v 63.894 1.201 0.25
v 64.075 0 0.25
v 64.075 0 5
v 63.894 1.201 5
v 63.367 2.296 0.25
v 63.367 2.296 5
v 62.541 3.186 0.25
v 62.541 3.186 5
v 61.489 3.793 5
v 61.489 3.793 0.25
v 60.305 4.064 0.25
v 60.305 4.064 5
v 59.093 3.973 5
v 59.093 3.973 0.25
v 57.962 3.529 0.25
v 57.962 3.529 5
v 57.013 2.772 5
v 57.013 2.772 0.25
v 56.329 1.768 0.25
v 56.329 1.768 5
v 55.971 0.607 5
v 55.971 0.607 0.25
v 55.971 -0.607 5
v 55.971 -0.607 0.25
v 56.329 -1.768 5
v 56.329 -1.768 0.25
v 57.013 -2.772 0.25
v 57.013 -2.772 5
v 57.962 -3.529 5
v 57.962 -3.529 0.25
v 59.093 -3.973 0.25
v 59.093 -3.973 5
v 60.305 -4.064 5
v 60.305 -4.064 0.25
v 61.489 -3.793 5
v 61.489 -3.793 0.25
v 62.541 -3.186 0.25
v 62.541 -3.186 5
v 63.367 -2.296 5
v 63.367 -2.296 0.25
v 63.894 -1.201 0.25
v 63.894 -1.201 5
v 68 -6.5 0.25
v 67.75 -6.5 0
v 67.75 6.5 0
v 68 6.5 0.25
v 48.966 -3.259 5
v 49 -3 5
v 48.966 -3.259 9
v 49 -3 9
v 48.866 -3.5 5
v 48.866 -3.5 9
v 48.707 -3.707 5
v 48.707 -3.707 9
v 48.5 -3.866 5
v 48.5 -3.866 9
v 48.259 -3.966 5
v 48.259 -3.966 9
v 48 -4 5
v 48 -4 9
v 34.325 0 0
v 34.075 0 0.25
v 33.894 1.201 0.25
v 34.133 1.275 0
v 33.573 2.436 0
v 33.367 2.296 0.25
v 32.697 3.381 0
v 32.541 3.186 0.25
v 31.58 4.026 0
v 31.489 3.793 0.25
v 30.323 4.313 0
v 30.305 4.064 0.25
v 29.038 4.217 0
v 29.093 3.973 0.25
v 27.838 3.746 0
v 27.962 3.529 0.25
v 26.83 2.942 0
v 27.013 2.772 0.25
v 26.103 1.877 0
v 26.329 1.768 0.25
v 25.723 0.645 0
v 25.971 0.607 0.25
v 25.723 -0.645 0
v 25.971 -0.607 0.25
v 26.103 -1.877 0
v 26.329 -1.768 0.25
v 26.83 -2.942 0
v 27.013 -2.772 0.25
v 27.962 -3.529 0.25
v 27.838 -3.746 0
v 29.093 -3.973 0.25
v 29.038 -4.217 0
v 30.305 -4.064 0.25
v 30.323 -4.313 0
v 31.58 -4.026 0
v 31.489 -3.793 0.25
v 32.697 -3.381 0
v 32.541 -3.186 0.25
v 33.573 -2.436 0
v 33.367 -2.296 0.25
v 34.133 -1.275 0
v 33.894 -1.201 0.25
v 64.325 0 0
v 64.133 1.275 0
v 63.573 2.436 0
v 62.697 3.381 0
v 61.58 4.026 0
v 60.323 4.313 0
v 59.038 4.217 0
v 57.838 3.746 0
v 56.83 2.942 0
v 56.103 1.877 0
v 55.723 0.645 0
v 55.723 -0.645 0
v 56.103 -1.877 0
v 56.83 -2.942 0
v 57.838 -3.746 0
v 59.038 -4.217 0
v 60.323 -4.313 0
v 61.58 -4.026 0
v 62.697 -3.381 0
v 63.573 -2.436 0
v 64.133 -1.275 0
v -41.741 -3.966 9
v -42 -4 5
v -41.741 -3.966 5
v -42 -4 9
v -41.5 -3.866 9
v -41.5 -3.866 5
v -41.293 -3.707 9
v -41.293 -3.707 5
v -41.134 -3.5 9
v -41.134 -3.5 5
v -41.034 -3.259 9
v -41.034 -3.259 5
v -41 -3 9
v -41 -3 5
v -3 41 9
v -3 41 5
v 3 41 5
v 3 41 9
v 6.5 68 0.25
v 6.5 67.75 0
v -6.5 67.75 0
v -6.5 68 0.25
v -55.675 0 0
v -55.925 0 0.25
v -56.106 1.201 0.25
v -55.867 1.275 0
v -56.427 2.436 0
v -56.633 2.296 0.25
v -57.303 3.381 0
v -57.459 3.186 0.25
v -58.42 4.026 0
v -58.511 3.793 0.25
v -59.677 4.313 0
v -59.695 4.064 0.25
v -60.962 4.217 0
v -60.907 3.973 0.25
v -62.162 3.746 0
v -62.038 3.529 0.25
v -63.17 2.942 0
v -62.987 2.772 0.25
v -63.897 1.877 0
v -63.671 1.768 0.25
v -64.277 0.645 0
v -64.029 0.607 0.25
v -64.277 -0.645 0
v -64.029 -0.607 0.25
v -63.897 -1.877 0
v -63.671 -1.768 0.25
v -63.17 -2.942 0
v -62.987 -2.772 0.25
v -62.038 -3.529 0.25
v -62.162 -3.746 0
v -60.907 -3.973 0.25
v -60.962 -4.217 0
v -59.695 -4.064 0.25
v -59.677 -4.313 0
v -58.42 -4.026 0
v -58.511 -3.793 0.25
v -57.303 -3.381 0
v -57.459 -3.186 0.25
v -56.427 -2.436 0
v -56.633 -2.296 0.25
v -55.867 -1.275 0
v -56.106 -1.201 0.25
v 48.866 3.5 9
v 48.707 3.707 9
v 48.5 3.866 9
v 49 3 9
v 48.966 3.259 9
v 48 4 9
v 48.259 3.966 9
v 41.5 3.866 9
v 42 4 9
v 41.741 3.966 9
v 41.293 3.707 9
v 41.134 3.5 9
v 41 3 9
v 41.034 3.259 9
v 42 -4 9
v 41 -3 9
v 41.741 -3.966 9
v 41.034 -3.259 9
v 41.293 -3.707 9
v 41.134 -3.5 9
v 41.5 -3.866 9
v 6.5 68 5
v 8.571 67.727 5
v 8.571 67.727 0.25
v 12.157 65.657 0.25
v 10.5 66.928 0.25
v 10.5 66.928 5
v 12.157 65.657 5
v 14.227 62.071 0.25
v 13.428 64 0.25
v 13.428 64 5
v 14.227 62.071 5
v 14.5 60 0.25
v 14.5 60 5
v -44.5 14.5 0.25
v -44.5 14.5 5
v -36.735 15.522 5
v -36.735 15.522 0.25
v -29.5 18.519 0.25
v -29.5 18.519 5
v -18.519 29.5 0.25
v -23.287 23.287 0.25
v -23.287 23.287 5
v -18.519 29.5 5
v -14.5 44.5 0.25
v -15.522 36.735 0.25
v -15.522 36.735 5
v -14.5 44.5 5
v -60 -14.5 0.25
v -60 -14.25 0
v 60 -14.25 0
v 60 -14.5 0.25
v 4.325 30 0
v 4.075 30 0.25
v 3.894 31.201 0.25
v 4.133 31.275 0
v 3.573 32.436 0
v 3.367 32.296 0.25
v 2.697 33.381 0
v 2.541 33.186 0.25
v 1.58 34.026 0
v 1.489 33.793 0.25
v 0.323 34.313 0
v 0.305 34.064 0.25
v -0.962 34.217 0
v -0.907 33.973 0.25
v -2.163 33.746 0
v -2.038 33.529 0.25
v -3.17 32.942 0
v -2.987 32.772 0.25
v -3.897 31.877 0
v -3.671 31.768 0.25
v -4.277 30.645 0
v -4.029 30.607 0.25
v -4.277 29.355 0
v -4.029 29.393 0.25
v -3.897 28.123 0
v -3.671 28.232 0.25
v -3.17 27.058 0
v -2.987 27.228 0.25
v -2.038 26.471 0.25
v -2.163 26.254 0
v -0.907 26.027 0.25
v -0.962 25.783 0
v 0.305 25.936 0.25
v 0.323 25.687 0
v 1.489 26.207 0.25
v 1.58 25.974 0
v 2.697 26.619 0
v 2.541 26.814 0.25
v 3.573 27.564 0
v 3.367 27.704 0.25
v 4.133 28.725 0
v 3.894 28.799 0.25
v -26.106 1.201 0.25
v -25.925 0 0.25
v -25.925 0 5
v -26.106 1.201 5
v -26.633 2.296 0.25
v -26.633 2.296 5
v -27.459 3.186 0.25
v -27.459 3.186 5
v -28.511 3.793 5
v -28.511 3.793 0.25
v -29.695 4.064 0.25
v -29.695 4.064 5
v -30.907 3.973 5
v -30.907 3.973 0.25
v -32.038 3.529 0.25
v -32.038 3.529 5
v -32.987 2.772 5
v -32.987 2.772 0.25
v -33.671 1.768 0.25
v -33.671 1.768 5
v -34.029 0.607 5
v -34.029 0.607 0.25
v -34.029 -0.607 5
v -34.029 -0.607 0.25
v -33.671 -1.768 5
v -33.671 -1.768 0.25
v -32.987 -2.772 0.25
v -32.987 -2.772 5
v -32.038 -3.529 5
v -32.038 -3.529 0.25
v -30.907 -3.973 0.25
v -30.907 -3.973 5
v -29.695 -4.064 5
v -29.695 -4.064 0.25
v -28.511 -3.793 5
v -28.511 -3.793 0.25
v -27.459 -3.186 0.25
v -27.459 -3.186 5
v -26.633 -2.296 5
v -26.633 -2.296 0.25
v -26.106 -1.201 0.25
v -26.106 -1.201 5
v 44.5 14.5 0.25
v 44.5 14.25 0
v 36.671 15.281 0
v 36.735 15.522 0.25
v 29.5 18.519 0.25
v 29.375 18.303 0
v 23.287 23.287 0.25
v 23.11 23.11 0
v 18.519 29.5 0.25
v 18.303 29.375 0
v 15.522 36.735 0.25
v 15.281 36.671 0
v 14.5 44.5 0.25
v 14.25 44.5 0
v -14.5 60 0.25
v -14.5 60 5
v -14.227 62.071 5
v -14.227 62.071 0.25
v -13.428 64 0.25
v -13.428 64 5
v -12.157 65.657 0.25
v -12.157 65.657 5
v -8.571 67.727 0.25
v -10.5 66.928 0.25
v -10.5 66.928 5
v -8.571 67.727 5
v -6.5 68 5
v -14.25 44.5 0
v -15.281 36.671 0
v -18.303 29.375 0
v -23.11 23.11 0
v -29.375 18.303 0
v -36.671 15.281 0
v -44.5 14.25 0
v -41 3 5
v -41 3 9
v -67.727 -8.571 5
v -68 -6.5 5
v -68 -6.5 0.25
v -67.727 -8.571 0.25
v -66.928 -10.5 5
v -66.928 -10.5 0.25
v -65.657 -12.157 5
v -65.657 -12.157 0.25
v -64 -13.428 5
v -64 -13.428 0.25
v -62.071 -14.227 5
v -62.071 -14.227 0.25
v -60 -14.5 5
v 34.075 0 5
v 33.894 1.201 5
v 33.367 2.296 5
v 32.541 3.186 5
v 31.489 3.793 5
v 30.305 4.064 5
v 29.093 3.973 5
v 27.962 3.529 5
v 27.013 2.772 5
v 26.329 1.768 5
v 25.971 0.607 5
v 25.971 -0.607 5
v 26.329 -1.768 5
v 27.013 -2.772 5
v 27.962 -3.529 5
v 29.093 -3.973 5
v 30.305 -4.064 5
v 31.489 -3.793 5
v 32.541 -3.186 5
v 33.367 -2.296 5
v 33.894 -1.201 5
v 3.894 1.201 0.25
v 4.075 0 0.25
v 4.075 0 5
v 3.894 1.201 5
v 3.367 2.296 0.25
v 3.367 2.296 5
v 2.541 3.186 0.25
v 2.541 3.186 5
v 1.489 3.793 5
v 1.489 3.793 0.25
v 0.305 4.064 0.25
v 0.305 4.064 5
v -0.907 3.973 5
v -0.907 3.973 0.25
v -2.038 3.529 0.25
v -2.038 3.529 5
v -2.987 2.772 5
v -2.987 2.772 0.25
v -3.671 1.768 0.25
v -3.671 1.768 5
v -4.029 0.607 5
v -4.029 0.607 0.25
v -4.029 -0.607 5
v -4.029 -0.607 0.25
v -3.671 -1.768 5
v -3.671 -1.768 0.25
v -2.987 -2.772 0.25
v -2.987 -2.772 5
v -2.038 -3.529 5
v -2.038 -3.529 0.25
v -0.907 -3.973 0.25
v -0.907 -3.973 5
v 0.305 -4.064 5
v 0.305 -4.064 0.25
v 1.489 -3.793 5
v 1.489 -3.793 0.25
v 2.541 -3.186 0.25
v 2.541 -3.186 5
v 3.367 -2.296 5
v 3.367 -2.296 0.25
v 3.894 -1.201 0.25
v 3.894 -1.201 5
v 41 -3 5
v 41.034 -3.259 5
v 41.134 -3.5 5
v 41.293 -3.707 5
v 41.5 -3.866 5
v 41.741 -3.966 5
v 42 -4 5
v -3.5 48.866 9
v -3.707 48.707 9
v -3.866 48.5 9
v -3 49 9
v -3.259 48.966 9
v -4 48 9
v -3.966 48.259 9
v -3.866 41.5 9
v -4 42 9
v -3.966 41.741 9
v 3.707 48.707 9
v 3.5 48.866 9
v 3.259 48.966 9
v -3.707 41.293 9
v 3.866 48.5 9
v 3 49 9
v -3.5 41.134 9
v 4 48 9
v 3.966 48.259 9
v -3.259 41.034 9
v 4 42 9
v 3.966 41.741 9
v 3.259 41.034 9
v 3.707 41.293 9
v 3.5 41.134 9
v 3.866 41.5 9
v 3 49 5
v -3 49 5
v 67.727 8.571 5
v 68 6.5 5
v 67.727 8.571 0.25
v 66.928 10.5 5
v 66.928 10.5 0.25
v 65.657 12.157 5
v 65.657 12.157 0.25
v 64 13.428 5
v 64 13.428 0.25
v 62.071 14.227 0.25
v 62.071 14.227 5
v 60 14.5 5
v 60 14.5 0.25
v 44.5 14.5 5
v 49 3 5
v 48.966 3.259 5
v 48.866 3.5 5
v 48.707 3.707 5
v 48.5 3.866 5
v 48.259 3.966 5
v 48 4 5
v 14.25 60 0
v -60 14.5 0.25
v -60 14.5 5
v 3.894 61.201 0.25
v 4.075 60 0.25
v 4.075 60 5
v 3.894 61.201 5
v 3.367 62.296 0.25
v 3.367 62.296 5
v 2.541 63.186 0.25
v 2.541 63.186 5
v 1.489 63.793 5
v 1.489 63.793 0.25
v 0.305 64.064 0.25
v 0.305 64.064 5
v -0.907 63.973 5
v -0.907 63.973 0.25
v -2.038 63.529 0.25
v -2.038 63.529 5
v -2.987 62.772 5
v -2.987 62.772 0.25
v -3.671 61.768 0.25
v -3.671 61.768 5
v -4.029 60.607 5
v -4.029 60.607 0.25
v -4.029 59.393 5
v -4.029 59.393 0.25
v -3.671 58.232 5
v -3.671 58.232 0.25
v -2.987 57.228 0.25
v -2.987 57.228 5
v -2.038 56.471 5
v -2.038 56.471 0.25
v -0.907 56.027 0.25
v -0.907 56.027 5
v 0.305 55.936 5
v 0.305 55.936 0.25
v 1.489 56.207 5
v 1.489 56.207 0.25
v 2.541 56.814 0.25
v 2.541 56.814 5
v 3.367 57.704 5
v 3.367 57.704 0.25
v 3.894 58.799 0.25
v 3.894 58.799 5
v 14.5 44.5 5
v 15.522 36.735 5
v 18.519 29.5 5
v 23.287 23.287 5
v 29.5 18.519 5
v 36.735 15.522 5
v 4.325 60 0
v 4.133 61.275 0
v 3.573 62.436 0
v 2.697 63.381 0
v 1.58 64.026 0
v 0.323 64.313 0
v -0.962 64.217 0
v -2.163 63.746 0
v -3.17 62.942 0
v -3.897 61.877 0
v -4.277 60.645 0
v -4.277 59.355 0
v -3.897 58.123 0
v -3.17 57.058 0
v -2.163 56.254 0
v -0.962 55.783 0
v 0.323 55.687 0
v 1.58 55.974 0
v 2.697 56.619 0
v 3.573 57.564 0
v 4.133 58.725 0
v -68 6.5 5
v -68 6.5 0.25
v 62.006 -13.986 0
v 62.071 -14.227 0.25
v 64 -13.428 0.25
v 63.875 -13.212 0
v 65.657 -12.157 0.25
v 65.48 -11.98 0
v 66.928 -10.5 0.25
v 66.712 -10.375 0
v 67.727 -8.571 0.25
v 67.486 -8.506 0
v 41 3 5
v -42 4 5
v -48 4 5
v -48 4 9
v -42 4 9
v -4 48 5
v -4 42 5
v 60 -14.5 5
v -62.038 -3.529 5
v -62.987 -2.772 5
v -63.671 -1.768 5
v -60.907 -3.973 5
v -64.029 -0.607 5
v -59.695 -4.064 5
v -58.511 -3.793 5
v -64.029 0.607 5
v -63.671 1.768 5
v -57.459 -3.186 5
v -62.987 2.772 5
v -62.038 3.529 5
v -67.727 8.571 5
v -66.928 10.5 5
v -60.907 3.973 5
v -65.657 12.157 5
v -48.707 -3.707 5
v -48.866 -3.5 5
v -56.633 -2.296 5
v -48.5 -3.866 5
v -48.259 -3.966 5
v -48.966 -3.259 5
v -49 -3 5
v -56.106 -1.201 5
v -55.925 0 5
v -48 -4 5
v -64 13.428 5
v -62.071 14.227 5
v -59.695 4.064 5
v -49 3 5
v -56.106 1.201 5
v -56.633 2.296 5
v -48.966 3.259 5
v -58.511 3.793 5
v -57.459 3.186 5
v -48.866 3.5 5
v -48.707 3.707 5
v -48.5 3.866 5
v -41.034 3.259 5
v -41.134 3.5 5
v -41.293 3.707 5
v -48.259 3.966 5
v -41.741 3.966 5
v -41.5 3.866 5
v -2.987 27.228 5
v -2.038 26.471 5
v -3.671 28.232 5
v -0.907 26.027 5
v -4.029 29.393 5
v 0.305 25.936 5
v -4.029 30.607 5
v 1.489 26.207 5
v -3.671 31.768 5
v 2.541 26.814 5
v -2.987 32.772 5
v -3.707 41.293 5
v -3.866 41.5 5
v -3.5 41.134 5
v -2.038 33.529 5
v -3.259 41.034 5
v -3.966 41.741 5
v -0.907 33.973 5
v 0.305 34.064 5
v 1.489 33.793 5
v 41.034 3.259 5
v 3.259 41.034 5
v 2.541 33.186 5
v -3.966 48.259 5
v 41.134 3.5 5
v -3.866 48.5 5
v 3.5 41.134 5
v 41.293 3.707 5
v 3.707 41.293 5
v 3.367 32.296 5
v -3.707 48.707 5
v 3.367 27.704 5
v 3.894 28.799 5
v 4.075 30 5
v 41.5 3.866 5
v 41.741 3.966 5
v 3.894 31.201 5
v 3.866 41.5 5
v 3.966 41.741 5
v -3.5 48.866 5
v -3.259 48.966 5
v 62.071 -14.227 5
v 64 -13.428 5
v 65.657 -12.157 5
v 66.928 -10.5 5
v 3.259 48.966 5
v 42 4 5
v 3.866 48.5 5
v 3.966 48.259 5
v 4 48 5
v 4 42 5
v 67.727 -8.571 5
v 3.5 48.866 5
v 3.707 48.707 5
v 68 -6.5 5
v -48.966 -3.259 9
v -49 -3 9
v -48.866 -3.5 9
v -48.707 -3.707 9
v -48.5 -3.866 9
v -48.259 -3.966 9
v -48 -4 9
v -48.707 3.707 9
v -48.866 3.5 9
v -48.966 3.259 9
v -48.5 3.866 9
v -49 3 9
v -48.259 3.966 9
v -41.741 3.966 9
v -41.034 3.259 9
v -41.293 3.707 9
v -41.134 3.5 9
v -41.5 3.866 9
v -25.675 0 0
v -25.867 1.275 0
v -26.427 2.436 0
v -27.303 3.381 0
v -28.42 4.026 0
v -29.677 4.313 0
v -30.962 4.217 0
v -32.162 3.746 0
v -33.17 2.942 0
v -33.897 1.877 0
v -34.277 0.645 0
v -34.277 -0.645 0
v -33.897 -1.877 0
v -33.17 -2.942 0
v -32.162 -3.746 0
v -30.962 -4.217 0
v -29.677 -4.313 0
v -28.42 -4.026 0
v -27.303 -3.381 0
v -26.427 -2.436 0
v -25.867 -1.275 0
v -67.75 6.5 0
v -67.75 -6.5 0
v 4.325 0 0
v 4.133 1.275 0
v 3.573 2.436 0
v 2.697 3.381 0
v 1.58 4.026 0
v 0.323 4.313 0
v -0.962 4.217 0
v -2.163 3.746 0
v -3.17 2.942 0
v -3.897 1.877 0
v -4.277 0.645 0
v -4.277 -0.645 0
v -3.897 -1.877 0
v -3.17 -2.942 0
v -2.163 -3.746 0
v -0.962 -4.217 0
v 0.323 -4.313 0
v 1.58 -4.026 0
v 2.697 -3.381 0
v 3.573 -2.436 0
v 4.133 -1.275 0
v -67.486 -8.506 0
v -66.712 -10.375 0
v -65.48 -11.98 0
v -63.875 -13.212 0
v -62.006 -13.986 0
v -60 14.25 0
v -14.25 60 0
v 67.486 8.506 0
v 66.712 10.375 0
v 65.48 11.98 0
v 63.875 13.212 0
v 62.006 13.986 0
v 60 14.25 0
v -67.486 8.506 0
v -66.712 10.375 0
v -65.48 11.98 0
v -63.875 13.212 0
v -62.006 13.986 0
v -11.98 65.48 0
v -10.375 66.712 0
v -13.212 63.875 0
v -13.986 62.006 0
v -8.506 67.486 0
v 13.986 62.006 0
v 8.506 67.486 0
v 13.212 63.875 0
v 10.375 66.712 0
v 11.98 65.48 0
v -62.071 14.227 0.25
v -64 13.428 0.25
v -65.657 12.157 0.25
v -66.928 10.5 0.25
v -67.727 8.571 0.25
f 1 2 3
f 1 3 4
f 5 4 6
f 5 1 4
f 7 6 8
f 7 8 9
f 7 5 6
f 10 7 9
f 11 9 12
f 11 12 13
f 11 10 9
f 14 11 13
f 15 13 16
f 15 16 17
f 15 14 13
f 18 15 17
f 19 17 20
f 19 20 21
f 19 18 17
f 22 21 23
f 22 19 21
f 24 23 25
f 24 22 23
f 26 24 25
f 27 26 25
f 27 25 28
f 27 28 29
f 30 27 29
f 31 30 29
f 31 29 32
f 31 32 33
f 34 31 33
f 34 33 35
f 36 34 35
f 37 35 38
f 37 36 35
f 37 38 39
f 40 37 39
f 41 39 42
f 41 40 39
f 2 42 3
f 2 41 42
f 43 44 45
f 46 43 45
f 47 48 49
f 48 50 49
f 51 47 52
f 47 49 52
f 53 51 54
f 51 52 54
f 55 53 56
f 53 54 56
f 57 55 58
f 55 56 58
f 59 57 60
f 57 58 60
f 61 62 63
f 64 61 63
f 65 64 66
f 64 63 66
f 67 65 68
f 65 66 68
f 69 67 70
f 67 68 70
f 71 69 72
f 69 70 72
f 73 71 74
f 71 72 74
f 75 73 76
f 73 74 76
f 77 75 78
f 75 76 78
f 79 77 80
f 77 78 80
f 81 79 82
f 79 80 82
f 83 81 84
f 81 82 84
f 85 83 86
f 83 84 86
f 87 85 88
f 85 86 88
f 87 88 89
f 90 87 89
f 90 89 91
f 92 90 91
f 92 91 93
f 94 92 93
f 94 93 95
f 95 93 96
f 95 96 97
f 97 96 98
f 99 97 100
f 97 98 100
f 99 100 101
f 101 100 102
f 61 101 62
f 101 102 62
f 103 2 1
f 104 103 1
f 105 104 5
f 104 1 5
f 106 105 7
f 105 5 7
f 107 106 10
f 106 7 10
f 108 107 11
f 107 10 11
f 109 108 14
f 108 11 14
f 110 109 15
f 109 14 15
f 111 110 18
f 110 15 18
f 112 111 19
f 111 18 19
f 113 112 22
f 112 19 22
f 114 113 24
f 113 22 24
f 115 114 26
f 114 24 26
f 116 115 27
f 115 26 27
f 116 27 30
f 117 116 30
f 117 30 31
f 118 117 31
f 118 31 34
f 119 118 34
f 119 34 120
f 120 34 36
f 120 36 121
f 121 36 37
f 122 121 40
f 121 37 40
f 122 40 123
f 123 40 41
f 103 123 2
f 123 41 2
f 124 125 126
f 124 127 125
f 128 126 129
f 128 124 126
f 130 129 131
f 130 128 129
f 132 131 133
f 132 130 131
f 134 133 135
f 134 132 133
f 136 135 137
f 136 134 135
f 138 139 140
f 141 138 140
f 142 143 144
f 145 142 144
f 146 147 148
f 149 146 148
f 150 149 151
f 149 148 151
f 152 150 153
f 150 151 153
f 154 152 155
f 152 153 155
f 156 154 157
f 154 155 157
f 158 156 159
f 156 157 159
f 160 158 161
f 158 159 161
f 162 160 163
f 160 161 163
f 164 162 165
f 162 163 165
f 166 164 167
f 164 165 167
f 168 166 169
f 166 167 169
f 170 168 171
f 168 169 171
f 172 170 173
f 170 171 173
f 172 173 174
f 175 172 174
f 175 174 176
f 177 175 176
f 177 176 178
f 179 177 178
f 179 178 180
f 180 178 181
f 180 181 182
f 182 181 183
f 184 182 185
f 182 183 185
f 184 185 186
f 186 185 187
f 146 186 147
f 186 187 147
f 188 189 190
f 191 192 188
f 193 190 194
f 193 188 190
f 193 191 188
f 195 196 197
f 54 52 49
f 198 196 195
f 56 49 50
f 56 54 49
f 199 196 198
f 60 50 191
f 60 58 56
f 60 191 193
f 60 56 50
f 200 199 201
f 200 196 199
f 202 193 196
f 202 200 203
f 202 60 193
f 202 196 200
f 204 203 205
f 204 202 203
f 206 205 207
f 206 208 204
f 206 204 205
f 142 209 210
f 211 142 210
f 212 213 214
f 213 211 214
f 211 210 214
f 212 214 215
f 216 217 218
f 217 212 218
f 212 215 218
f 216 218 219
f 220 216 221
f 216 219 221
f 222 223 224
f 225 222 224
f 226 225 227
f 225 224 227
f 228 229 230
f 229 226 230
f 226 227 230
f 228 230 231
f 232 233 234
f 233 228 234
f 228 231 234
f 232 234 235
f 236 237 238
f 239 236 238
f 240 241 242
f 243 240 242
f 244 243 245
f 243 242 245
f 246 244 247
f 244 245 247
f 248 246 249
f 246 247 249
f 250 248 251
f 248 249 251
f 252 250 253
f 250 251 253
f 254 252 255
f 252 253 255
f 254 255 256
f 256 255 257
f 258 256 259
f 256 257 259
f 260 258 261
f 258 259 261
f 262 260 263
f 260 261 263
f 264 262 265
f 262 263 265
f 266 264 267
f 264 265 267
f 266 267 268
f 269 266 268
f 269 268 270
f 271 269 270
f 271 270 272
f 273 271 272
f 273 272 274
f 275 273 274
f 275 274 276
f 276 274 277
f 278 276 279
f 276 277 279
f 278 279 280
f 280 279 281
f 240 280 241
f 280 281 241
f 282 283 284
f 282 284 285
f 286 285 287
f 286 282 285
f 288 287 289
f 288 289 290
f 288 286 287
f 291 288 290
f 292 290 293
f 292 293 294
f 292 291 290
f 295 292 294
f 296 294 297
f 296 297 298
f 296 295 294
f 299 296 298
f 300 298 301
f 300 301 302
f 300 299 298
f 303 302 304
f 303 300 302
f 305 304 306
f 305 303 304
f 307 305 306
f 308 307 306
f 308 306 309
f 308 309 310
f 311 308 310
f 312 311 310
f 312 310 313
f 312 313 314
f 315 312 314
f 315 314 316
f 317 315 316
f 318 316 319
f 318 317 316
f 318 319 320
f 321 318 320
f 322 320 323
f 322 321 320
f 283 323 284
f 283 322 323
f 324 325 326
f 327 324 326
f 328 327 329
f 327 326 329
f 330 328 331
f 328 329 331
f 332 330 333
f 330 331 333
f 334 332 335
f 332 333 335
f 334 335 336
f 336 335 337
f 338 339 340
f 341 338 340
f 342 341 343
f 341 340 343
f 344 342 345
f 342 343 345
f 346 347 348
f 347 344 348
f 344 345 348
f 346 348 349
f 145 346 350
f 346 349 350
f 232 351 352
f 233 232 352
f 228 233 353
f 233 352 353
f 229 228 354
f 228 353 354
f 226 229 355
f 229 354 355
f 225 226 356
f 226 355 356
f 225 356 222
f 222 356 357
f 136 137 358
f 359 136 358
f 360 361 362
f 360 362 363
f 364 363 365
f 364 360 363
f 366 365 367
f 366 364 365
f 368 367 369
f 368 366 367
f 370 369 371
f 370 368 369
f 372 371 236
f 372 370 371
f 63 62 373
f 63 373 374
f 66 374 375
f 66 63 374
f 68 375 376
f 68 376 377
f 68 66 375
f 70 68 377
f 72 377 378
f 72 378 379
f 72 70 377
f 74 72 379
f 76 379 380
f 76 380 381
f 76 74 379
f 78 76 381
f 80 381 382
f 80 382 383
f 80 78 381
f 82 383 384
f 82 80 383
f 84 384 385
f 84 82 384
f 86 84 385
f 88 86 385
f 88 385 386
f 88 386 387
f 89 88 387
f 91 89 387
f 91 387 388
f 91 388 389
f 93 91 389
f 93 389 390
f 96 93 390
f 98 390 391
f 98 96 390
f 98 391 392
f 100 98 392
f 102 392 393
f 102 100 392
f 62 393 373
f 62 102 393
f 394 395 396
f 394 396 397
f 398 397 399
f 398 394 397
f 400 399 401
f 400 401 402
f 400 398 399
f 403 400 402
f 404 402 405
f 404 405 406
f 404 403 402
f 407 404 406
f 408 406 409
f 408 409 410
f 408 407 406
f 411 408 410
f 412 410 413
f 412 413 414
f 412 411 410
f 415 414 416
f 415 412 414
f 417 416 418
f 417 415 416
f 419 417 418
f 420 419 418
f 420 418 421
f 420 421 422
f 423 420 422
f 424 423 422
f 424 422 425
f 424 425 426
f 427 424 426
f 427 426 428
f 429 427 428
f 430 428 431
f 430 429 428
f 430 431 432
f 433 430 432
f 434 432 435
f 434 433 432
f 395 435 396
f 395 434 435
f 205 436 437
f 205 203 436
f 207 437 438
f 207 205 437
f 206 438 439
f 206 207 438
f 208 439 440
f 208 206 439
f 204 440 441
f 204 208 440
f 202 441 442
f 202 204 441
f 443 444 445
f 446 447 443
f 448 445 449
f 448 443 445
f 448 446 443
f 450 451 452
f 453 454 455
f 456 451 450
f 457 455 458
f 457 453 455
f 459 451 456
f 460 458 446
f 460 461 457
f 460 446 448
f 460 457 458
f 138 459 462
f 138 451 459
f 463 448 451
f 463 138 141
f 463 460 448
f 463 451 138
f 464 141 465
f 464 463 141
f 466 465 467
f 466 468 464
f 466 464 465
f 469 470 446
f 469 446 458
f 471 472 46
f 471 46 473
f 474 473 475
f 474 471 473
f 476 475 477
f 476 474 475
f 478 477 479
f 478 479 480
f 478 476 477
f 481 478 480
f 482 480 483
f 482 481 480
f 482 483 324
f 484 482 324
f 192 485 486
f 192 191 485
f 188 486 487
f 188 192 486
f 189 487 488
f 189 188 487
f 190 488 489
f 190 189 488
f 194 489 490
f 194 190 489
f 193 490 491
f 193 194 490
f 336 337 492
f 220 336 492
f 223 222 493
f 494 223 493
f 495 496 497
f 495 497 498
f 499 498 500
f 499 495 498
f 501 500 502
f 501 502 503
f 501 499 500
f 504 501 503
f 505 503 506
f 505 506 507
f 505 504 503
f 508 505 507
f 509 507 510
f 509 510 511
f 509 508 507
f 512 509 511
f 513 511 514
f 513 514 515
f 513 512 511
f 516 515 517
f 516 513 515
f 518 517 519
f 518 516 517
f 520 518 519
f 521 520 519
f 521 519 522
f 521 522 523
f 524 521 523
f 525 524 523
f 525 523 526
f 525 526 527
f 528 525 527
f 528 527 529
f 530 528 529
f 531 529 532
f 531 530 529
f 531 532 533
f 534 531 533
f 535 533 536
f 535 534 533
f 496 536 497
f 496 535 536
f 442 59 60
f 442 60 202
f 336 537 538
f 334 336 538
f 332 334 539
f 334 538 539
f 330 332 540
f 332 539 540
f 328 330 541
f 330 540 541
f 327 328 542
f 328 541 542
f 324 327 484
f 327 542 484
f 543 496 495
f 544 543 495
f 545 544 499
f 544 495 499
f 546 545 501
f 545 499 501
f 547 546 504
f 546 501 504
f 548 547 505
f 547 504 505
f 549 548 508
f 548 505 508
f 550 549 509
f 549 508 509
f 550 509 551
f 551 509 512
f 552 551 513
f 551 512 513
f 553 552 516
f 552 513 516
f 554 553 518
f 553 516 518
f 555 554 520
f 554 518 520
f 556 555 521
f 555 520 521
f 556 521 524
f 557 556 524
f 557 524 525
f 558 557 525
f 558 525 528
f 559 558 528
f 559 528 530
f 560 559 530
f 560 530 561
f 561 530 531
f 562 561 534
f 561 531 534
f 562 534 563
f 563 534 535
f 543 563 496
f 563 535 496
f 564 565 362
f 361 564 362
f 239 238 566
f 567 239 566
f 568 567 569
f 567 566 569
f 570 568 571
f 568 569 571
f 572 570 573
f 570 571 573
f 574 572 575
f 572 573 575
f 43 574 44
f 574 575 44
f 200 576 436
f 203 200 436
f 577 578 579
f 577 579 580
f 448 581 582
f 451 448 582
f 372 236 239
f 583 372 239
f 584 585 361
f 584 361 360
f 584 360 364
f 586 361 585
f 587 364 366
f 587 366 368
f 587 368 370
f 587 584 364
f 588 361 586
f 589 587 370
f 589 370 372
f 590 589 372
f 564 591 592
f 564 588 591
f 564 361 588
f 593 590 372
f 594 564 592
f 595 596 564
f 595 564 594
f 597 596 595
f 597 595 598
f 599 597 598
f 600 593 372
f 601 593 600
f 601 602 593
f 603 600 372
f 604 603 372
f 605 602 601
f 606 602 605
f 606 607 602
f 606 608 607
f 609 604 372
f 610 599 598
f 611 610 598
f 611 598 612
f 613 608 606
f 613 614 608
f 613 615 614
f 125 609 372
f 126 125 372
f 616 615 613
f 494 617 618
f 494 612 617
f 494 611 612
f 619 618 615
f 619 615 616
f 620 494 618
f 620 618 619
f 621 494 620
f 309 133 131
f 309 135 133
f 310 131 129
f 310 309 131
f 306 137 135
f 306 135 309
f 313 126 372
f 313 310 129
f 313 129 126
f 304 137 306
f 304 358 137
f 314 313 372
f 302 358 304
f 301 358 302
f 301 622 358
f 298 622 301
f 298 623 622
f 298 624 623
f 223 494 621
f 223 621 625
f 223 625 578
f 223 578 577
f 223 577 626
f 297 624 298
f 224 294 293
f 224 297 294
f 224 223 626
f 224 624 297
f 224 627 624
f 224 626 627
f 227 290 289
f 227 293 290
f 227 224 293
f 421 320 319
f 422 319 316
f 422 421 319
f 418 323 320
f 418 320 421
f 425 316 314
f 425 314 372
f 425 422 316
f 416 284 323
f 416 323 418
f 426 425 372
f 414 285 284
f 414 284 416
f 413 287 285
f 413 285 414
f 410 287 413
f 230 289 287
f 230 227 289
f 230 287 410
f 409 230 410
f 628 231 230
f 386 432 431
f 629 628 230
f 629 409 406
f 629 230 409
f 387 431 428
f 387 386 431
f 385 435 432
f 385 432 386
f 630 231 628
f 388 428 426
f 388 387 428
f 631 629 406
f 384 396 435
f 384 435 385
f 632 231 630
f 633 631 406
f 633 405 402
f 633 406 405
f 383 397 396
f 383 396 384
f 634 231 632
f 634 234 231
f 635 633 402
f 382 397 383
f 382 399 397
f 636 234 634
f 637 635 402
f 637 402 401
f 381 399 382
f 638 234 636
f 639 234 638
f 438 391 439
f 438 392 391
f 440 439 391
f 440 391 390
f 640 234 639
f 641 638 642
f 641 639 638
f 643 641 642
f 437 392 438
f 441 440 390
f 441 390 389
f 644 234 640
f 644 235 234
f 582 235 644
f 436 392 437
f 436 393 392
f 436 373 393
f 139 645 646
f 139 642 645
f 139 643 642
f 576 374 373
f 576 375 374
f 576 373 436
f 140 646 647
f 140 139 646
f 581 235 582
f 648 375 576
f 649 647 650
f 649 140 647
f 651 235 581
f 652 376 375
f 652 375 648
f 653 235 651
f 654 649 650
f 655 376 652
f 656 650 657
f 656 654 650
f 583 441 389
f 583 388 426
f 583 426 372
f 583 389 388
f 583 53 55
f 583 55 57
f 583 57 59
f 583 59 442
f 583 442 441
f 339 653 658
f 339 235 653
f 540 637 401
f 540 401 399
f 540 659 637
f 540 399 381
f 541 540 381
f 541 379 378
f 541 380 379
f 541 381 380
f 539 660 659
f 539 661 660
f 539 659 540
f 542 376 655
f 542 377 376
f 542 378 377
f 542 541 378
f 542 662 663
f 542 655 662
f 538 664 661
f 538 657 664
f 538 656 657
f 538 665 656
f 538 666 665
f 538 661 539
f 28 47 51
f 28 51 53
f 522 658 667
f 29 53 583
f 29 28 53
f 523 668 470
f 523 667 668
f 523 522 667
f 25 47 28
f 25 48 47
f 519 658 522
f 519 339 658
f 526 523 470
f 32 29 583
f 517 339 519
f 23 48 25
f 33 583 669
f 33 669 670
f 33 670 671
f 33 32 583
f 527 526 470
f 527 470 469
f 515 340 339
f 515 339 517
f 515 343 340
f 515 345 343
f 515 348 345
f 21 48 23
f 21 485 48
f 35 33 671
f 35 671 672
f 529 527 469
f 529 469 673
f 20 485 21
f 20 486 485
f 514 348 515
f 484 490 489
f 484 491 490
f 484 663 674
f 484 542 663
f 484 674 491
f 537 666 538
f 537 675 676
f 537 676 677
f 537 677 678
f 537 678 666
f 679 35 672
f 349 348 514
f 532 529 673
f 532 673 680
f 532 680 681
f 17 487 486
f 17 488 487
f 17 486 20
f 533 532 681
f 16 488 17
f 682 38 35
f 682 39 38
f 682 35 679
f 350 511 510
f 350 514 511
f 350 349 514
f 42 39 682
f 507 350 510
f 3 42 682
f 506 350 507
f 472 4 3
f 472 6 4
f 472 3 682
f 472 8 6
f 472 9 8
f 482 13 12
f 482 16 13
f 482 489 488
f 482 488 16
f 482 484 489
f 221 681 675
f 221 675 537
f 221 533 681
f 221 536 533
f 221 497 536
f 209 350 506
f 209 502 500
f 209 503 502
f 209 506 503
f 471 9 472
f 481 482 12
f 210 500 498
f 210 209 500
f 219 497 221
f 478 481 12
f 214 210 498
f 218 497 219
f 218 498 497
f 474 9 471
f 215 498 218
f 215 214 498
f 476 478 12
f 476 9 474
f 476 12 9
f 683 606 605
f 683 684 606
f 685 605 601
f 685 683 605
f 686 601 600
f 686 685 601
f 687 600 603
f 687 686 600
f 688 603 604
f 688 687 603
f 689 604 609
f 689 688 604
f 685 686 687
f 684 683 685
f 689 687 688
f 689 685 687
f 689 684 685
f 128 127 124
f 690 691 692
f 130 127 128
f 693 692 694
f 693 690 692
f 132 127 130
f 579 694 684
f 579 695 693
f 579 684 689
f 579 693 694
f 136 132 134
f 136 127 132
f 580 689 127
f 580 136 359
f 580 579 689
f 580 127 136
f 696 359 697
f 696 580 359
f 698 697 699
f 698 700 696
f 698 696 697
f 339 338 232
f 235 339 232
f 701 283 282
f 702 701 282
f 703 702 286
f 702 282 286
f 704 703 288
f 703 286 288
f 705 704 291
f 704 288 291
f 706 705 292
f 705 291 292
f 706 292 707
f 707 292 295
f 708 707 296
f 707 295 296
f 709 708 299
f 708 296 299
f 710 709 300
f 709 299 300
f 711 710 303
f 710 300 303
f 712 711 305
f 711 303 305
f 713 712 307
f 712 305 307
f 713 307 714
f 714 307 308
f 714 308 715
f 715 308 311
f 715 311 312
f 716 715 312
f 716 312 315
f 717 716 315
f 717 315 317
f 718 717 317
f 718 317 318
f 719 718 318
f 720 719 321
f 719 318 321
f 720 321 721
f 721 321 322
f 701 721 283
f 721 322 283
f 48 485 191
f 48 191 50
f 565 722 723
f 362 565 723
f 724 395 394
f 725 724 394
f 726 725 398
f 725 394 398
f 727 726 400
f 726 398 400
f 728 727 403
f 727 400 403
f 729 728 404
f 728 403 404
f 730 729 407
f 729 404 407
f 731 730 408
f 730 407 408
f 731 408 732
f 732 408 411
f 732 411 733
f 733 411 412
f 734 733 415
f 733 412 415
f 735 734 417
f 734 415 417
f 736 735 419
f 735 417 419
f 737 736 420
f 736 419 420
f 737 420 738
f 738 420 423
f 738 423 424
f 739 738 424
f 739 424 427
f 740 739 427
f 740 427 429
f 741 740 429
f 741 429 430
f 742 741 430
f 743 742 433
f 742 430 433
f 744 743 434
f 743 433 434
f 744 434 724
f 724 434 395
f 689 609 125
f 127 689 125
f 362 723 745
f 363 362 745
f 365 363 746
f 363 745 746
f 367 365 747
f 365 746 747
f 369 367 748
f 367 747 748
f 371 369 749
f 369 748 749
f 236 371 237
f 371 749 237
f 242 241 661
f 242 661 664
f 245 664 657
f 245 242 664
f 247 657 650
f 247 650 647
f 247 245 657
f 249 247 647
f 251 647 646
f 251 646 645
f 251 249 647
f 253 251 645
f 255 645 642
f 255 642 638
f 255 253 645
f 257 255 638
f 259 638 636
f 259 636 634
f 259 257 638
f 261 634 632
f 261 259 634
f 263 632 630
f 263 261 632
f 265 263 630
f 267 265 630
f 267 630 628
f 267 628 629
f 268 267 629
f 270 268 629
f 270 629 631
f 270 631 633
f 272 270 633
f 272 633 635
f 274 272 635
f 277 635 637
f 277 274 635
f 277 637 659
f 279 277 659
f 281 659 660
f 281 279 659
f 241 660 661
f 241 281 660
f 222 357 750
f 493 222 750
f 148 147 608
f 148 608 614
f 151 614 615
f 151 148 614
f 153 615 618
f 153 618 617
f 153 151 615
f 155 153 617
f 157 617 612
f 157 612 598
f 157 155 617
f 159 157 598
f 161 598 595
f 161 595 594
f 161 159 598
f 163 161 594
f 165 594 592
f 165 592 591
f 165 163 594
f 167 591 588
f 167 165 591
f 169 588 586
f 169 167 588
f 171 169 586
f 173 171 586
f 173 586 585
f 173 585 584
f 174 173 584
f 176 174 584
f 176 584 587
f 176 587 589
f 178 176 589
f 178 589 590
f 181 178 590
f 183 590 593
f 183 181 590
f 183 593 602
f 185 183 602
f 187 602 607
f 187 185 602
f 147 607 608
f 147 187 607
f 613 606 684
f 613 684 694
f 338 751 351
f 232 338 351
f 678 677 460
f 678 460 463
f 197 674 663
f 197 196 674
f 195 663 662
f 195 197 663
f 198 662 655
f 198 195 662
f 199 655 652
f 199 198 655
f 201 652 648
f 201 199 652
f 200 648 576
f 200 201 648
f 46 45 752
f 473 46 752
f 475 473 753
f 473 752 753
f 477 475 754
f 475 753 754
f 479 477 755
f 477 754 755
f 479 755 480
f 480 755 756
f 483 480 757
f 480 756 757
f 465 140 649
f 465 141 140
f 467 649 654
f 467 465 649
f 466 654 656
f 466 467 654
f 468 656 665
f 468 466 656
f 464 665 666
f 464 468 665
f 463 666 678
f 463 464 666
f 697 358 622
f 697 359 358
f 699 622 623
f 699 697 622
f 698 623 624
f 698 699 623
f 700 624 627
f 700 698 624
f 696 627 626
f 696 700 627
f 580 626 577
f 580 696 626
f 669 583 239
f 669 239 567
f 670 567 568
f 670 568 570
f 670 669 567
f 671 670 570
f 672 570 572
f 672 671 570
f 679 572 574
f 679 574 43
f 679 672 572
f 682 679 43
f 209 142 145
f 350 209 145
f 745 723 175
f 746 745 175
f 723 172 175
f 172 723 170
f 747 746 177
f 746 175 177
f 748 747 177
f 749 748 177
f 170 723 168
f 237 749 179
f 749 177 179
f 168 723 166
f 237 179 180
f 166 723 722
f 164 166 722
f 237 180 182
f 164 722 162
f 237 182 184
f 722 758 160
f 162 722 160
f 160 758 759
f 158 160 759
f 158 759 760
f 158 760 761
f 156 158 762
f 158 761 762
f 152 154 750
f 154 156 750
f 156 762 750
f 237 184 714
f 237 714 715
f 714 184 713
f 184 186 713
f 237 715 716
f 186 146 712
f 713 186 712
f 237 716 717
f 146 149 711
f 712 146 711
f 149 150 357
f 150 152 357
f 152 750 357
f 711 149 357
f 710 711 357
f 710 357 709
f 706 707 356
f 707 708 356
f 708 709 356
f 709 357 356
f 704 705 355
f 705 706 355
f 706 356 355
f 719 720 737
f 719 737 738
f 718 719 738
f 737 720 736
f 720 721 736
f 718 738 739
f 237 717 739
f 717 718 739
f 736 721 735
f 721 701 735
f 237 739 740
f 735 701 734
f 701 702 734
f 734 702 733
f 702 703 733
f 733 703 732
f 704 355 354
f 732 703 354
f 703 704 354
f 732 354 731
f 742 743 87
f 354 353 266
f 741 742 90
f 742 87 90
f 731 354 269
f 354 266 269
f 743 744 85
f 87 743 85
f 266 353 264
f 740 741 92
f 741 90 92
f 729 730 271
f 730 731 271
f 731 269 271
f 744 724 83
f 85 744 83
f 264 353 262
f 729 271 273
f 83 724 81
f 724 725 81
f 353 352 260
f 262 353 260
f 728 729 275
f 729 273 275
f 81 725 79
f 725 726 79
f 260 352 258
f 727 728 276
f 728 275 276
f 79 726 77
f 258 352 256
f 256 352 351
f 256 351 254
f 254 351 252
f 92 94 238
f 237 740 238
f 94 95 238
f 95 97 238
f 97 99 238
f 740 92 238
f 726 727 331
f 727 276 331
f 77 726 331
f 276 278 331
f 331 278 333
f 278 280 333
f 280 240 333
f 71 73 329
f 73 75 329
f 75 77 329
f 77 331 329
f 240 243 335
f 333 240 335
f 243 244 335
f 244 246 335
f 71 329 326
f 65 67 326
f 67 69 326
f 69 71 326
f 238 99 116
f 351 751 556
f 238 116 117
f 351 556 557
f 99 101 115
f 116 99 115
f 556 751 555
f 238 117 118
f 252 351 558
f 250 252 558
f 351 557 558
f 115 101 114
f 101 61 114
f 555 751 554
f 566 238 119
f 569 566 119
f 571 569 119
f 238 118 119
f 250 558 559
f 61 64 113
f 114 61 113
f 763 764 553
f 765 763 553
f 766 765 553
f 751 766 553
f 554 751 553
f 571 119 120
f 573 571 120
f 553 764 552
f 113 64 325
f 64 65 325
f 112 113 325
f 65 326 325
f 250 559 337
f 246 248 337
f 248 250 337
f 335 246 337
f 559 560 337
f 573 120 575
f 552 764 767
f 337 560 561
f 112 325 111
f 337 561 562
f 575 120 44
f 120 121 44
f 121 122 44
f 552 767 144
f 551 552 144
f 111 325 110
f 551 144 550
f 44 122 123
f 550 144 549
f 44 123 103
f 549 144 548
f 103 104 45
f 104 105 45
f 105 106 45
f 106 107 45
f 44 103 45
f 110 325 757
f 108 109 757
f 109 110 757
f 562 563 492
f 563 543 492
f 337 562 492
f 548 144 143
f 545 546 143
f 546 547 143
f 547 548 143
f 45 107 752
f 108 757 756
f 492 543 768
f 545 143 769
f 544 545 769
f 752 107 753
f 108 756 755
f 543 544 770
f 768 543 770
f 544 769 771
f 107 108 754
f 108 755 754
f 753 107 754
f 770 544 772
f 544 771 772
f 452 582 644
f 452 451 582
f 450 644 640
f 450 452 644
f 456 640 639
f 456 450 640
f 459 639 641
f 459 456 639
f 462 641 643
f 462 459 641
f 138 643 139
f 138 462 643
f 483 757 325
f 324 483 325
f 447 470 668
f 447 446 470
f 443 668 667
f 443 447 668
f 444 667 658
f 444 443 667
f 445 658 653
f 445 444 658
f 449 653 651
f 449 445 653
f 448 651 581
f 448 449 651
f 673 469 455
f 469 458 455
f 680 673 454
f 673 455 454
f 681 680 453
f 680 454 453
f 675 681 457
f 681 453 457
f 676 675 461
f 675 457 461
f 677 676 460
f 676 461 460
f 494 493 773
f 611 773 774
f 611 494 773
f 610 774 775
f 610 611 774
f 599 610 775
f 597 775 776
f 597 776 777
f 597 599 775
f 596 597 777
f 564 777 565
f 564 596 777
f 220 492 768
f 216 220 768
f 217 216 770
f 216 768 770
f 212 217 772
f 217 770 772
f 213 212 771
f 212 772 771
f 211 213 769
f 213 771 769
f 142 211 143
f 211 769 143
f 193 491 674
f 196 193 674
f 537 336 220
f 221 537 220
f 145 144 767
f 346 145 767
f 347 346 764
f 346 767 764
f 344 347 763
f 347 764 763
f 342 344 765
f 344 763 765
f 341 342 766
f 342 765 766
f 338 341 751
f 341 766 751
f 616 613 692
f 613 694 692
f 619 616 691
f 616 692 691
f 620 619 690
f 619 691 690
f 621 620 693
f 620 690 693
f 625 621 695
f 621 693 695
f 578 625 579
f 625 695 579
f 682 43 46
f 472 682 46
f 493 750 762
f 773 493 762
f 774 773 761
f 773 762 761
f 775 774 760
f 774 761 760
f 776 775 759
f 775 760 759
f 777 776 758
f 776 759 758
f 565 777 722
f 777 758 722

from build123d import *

# Parameters (mm, degrees)
F0_R     = 4.075
F1_DEPTH = 5
F2_R     = 8
F3_R     = 30
F4_W     = 8
F4_H     = 8
F5_DEPTH = 4
F6_R     = 1
F8_COUNT = 3
F8_ANGLE = 180
F9_SIZE  = 0.25


with BuildPart() as f1:
    # F0 (on Top) → F1 (new body)
    with BuildSketch(Plane.XY):
        Polygon((-14.5, 14.5), (-68, 14.5), (-68, -14.5), (0, -14.5), (68, -14.5), (68, 14.5), (14.5, 14.5), (14.5, 68), (-14.5, 68), align=None)
        with Locations((-60, 0)):
            Circle(F0_R, mode=Mode.SUBTRACT)
        with Locations((-30, 0)):
            Circle(F0_R, mode=Mode.SUBTRACT)
        Circle(F0_R, mode=Mode.SUBTRACT)
        with Locations((30, 0)):
            Circle(F0_R, mode=Mode.SUBTRACT)
        with Locations((60, 0)):
            Circle(F0_R, mode=Mode.SUBTRACT)
        with Locations((0, 30)):
            Circle(F0_R, mode=Mode.SUBTRACT)
        with Locations((0, 60)):
            Circle(F0_R, mode=Mode.SUBTRACT)
    extrude(amount=F1_DEPTH)

    # F2
    f2_edges = [f1.edges().sort_by_distance(p)[0] for p in [
        (-14.5, 68, 2.5),
        (14.5, 68, 2.5),
        (-68, 14.5, 2.5),
        (-68, -14.5, 2.5),
        (68, 14.5, 2.5),
        (68, -14.5, 2.5),
    ]]
    fillet(f2_edges, radius=F2_R)

    # F3
    f3_edges = [f1.edges().sort_by_distance(p)[0] for p in [
        (14.5, 14.5, 2.5),
        (-14.5, 14.5, 2.5),
    ]]
    fillet(f3_edges, radius=F3_R)



with BuildPart() as f5:
    # F4 (on face) → F5 (new body)
    with BuildSketch(Plane.XY.offset(5)):
        with Locations((-45, 0)):
            Rectangle(F4_W, F4_H)
    extrude(amount=F5_DEPTH)

    # F6
    f6_edges = [f5.edges().sort_by_distance(p)[0] for p in [
        (-49, -4, 7),
        (-41, -4, 7),
        (-49, 4, 7),
        (-41, 4, 7),
    ]]
    fillet(f6_edges, radius=F6_R)


with BuildPart() as f1_1:
    add(f1.part)

    add(f5.part)  # F8 merges F5
    # F8: F5 ×3 about axis
    f8_axis = Axis((0, 0, 11.3541549072), (0, 0, -1))
    for i in range(1, F8_COUNT):
        add(f5.part.rotate(f8_axis, i * F8_ANGLE / (F8_COUNT - 1)))

    # F9
    f9_edges = [f1_1.edges().sort_by_distance(p)[0] for p in [
        (-52.25, 14.5, 0),
        (-23.286797, 23.286797, 0),
        (-65.656854, 12.156854, 0),
        (-14.5, 52.25, 0),
        (-68, 0, 0),
        (-12.156854, 65.656854, 0),
        (-65.656854, -12.156854, 0),
        (0, 68, 0),
        (0, -14.5, 0),
        (12.156854, 65.656854, 0),
        (65.656854, -12.156854, 0),
        (14.5, 52.25, 0),
        (68, 0, 0),
        (23.286797, 23.286797, 0),
        (65.656854, 12.156854, 0),
        (52.25, 14.5, 0),
        (-64.075, 0, 0),
        (-34.075, 0, 0),
        (-4.075, 0, 0),
        (25.925, 0, 0),
        (55.925, 0, 0),
        (-4.075, 30, 0),
        (-4.075, 60, 0),
    ]]
    chamfer(f9_edges, length=F9_SIZE)


solid = f1_1.part
